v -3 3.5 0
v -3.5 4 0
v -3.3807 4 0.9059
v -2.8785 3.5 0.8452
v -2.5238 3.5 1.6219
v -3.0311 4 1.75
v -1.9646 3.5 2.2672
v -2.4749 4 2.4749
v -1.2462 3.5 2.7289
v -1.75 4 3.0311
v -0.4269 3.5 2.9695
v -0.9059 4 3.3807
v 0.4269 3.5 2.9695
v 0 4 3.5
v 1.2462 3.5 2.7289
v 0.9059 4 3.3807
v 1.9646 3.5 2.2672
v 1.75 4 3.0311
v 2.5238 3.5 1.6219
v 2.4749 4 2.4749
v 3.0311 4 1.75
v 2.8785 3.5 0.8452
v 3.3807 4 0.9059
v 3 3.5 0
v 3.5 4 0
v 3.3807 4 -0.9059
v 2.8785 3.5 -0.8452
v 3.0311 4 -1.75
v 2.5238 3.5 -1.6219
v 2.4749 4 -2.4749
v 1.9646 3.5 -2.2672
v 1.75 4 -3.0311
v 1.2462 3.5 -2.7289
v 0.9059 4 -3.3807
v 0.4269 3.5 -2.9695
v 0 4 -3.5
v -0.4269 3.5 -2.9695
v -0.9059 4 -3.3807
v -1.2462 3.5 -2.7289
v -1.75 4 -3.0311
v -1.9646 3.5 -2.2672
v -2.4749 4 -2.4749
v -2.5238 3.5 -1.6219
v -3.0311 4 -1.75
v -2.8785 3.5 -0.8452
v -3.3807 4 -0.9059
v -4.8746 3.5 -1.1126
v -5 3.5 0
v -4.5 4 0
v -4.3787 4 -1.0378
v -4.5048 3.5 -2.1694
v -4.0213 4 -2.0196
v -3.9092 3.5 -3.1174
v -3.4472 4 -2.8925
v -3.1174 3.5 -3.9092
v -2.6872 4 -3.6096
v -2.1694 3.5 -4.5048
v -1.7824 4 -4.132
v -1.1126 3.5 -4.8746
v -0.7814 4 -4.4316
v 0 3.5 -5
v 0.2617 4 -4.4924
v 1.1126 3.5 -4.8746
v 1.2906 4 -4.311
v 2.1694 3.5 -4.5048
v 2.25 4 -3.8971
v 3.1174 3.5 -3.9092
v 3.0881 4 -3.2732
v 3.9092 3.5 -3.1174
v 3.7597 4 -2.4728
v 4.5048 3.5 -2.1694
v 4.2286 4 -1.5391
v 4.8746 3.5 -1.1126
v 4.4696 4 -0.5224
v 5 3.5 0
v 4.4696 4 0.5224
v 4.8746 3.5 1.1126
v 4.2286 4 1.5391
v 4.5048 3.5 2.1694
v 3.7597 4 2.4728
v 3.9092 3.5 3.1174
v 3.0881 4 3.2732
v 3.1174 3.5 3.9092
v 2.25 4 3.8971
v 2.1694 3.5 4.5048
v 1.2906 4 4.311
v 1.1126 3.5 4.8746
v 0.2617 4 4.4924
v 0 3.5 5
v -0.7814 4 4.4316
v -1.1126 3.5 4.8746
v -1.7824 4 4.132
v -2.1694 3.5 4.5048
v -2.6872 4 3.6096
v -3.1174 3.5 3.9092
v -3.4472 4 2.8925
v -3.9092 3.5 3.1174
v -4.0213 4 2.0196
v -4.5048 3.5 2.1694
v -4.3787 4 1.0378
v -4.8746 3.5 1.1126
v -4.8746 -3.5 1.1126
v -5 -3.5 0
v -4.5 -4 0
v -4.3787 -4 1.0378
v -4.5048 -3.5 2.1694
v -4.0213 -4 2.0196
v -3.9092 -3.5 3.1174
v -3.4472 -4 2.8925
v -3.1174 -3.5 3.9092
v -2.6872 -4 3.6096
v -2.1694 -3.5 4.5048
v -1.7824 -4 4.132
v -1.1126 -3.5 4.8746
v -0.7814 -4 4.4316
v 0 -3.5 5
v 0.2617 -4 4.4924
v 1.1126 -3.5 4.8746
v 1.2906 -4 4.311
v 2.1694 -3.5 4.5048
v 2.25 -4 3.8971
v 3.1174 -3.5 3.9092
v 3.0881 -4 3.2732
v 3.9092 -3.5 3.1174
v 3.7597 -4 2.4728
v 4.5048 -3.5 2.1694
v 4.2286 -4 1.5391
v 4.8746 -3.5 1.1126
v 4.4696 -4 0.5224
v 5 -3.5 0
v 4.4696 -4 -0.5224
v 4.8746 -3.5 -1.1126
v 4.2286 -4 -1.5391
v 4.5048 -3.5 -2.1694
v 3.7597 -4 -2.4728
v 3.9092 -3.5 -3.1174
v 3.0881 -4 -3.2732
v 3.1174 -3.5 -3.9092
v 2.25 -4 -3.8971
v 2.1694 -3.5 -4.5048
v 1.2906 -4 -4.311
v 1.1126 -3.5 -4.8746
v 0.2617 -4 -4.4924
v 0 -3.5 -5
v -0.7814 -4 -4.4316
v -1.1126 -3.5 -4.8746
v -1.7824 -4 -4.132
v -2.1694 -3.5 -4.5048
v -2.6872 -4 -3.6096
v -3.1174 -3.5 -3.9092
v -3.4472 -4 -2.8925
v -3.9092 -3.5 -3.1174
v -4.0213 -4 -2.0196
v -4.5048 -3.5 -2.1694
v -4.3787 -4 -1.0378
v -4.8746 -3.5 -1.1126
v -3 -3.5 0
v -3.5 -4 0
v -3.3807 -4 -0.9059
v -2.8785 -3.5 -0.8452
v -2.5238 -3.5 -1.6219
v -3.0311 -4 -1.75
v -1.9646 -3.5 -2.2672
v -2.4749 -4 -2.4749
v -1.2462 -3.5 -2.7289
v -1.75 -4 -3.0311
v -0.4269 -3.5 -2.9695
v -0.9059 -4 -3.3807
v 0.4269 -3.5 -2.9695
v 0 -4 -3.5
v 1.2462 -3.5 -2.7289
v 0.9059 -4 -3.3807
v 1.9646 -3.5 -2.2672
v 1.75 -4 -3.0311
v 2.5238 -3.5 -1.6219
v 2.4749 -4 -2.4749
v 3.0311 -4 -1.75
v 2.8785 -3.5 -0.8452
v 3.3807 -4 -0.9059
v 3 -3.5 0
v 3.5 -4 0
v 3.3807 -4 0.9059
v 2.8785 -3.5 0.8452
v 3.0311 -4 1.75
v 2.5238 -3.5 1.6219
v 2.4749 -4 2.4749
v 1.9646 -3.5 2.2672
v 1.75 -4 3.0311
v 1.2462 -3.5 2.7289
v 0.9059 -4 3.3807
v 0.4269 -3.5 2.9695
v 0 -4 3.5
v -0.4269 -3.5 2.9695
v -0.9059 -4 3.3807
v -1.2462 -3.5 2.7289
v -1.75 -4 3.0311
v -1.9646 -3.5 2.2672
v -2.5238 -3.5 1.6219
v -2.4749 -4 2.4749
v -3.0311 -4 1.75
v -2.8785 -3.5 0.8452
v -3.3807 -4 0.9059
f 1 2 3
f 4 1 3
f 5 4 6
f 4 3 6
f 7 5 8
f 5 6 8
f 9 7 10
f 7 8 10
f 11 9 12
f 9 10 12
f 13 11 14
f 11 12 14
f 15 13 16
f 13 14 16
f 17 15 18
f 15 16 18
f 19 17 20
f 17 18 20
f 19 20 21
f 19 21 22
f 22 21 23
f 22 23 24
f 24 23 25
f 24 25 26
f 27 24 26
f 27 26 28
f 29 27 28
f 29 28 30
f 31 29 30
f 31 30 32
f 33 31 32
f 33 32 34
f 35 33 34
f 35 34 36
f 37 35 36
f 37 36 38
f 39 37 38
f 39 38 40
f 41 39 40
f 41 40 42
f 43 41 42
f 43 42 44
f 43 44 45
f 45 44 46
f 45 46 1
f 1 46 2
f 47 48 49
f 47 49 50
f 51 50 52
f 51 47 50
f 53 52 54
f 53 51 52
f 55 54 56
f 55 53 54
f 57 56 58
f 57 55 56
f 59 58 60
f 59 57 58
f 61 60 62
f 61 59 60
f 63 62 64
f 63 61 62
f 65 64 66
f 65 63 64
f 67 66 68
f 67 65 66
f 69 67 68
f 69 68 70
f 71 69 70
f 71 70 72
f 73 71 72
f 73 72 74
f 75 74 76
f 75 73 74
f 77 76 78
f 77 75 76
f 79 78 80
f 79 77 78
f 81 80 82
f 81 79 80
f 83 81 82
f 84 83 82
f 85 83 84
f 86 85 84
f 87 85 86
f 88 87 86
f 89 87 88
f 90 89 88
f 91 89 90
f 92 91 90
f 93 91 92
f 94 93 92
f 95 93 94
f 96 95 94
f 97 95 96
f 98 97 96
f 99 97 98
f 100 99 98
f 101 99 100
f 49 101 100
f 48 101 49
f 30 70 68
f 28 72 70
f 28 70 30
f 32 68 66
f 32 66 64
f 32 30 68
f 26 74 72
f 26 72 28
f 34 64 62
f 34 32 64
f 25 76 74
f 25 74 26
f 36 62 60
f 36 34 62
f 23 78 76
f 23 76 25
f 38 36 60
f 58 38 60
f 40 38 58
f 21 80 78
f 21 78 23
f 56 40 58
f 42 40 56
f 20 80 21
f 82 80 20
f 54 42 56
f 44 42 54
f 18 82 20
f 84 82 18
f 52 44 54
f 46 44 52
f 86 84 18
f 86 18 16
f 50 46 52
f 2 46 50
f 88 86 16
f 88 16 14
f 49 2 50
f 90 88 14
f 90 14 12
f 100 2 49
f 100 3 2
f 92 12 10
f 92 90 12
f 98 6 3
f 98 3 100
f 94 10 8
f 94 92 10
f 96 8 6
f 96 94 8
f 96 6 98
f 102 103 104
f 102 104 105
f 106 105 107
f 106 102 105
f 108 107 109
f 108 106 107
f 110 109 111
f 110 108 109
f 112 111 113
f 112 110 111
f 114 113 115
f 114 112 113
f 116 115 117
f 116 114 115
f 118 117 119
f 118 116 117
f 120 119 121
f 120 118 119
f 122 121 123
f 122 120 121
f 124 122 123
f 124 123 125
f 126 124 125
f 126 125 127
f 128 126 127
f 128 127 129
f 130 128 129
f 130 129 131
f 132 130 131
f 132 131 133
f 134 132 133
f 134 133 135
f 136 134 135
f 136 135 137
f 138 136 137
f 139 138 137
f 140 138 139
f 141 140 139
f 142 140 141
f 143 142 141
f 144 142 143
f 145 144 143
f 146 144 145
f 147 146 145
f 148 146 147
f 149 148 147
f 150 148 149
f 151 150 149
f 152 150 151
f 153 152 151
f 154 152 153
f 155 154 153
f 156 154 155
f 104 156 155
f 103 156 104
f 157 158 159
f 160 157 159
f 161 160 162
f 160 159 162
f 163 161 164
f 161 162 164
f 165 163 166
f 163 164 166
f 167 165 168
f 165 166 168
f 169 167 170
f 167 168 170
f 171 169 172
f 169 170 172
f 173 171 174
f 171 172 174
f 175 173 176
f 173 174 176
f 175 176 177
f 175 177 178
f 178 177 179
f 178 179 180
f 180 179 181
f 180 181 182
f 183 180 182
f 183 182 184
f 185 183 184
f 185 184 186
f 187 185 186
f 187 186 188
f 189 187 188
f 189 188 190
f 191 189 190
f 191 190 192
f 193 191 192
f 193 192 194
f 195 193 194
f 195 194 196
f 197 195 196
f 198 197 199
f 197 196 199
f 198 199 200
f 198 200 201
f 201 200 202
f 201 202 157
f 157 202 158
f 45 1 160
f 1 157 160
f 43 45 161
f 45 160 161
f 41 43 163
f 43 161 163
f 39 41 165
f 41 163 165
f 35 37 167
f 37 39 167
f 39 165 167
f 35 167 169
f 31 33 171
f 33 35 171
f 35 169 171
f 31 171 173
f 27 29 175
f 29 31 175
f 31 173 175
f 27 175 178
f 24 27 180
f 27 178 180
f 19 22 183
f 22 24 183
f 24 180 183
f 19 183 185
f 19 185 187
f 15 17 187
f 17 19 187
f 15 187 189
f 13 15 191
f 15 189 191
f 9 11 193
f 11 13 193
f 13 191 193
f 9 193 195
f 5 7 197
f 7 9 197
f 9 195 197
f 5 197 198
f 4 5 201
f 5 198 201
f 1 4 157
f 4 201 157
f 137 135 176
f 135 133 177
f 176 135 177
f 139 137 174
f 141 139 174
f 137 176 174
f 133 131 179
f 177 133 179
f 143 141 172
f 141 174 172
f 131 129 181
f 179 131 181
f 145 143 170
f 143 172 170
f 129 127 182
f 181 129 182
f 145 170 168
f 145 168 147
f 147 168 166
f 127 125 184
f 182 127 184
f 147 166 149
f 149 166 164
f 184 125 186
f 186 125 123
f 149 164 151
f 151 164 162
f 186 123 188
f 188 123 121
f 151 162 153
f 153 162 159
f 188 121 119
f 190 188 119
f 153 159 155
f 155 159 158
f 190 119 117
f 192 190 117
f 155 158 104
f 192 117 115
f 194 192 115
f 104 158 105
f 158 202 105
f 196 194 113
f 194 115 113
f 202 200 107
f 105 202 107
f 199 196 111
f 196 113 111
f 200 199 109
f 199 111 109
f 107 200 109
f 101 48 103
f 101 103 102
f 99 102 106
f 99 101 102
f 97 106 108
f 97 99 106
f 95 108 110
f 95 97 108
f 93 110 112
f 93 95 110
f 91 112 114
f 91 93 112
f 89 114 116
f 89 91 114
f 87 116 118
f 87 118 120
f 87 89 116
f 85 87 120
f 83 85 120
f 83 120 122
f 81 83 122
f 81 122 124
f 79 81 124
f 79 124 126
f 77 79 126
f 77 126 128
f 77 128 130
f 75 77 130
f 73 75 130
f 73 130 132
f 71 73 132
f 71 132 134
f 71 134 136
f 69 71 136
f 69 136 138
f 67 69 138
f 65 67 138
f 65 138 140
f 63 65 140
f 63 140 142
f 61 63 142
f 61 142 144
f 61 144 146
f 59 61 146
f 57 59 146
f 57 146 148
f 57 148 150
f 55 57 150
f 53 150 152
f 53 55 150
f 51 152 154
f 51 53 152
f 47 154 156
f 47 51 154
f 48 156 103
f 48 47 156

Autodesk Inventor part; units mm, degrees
ref_plane "YZ Plane" through (0, 0, 0) normal (1, 0, 0) x (0, 1, 0)
ref_plane "XZ Plane" through (0, 0, 0) normal (0, 1, 0) x (-1, 0, 0)
ref_plane "XY Plane" through (0, 0, 0) normal (0, 0, 1) x (1, 0, 0)
sketch "Esboço1" plane through (0, 0, 0) normal (0, 0, 1) x (1, 0, 0)
  line L0 (-6, 0) -> (1, 0) construction
  line L1 (0, -5.6) -> (0, 5.6) construction
  line L2 (-5, 4) -> (-3, 4)
  line L3 (-3, 4) -> (-3, -4)
  line L4 (-3, -4) -> (-5, -4)
  line L5 (-5, -4) -> (-5, 4)
  point P0 (0, 0)
  dimension "d1" = 8
  dimension "d2" = 10
  dimension "d3" = 6
revolve "Revolução1" add sketch "Esboço1" angle 360 about axis through (0, -10, 0) along (0, 1, 0)
chamfer "Chanfro1" distance 0.5 angle 45 4 edges at (5, -4, 0) (3, -4, 0) (3, 4, 0) (5, 4, 0)
properties part number "GRJ-03-117" material "Latão YL"
